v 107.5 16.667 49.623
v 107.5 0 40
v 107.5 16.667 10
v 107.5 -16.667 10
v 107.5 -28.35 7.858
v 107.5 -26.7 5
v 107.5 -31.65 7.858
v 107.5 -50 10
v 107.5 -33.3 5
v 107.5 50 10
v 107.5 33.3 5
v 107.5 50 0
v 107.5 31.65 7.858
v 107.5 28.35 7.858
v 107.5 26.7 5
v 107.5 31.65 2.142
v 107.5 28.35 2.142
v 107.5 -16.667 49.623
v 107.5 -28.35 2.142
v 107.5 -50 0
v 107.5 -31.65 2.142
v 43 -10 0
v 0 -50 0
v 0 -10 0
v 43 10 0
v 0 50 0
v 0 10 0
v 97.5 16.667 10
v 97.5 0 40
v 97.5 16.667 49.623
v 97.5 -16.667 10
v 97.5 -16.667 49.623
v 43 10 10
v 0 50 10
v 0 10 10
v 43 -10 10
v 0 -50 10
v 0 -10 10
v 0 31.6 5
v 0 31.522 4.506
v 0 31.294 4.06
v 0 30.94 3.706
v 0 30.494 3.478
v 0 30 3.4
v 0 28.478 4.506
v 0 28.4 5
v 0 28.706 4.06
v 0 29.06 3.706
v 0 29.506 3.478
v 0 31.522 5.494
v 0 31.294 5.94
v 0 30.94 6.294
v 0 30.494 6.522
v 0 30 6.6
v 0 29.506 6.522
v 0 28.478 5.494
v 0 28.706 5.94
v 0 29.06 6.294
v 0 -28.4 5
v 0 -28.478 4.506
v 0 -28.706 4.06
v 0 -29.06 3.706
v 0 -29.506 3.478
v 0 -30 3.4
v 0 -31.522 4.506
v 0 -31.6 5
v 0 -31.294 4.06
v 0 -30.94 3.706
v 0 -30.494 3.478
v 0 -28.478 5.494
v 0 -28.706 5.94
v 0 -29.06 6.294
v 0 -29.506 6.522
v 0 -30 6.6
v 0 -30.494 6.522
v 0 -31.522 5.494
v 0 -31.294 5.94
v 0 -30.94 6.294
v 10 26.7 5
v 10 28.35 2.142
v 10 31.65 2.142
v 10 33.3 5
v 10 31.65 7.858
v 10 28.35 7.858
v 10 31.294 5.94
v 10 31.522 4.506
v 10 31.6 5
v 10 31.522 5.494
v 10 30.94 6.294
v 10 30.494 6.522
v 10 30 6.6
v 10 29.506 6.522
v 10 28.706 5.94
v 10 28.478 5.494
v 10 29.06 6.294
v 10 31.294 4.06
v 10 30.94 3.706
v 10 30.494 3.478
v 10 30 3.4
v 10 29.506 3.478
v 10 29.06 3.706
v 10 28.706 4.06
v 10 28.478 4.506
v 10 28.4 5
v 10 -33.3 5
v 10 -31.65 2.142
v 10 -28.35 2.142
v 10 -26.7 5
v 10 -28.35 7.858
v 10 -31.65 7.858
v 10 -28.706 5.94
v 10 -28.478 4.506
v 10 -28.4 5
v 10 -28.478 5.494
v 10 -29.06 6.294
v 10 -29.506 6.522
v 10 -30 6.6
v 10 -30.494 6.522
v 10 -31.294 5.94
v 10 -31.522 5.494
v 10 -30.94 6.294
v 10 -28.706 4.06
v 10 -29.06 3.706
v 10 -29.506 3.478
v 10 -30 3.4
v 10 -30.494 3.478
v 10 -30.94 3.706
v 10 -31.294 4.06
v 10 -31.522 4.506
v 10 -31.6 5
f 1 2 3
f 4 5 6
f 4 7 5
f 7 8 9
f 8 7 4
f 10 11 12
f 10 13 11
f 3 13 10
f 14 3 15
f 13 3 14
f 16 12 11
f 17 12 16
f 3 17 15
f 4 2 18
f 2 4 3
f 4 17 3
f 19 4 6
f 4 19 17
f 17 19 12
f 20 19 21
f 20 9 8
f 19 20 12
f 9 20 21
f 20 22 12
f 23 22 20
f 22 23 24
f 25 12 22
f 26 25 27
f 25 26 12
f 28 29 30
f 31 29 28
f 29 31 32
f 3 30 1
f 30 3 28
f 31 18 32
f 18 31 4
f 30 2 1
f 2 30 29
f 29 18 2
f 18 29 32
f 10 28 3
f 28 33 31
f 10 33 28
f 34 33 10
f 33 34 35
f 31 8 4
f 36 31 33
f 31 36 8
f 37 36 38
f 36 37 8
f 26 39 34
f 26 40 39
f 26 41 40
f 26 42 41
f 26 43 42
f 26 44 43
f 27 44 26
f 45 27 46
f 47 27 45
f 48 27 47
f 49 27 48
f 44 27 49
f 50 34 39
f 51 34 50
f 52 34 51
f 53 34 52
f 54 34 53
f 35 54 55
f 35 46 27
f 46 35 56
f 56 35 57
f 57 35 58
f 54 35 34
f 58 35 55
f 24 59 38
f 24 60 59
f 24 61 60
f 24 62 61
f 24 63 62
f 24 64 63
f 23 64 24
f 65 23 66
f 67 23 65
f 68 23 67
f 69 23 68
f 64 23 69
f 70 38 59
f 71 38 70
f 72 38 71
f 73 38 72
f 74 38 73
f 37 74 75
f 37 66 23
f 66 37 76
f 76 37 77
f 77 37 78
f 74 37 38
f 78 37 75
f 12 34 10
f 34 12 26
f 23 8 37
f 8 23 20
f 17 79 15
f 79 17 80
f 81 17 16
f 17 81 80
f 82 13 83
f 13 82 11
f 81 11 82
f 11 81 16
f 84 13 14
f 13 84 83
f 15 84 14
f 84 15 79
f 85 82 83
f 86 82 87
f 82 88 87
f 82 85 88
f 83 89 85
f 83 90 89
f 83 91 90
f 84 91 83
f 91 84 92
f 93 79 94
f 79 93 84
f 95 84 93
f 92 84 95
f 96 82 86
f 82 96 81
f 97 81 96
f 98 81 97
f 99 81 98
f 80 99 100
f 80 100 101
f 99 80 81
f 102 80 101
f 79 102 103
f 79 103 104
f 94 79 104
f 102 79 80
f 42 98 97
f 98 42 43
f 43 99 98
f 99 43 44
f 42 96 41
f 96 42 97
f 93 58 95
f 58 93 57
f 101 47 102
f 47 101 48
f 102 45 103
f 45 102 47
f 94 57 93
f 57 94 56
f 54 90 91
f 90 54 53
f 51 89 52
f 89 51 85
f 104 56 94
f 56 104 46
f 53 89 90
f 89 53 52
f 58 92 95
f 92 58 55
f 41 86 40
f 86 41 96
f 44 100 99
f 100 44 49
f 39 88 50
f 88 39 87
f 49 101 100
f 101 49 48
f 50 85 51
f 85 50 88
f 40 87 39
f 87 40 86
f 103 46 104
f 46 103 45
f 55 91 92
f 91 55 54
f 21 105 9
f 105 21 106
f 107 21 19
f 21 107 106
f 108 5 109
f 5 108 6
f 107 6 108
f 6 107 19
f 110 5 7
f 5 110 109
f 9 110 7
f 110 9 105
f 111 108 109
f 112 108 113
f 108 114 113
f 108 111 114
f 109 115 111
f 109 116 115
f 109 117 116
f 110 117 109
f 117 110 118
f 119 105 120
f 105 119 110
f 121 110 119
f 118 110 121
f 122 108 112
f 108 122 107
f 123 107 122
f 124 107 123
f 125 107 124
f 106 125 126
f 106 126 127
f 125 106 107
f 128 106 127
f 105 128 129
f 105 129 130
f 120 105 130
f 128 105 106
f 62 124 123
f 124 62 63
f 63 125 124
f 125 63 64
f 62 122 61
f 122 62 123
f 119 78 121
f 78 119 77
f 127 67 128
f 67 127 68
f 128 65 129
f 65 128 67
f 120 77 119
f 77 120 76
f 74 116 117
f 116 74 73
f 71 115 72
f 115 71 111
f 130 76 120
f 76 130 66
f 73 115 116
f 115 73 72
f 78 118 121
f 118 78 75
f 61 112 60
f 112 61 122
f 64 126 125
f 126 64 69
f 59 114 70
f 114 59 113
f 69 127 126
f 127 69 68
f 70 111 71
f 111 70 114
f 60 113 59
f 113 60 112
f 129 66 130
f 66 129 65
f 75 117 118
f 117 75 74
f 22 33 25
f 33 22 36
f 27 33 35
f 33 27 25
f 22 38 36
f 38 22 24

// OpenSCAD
// file: ../lib/naca4.scad
// Naca4.scad - library for parametric airfoils of 4 digit NACA series
// Code: Rudolf Huttary, Berlin 
// June 2015
// commercial use prohibited


// general use: for more examples refer to sampler.scad
// naca = naca digits or 3el vector  (default = 12 or [0, 0, .12])
// L    = chord length [mm]      (default= 100)
// N    = # sample points        (default= 81)
// h    = height [mm]            (default= 1)
// open = close at the thin end? (default = true)
// two equivalent example calls
 airfoil(naca = 2408, L = 60, N=1001, h = 30, open = false); 
// airfoil(naca = [.2, .4, .32], L = 60, N=1001, h = 30, open = false); 

module help()
{
  echo(str("\n\nList of signatures in lib:\n=================\n", 
  "module airfoil(naca=2412, L = 100, N = 81, h = 1, open = false) - renders airfoil object\n", 
  "module airfoil(naca=[.2, .4, .12], L = 100, N = 81, h = 1, open = false) - renders airfoil object using percentage for camber,  camber distance and thicknes\n", 
  "function airfoil_data(naca=12, L = 100, N = 81, open = false)\n",
  "=================\n")); 
}

help(); 
// this is the object
module airfoil(naca=12, L = 100, N = 81, h = 1, open = false)
{
  linear_extrude(height = h)
  polygon(points = airfoil_data(naca, L, N, open)); 
}

module hollow_airfoil(lnaca=12, L = 100, N = 81, h = 1, open = false, wall_thickness = 1)
{
    if (open){
        linear_extrude(height = h)
            difference(){
                polygon(points = airfoil_data(naca, L, N, false));
                offset(delta = - wall_thickness, chamfer = false) polygon(points = airfoil_data(naca, L, N, open = false));
            }
    }
    else{

        linear_extrude(height = wall_thickness)
            polygon(points = airfoil_data(naca, L, N, false)); 

        linear_extrude(height = h)
            difference(){
                polygon(points = airfoil_data(naca, L, N, open));
                offset(delta = - wall_thickness) polygon(points = airfoil_data(naca, L, N, open = false));
            }

        translate([0,0, h - wall_thickness])
            linear_extrude(height = wall_thickness)
                polygon(points = airfoil_data(naca, L, N, false)); 

    }
}


// this is the main function providing the airfoil data
function airfoil_data(naca=12, L = 100, N = 81, open = false) = 
  let(Na = len(naca)!=3?NACA(naca):naca)
  let(A = [.2969, -0.126, -.3516, .2843, open?-0.1015:-0.1036])
  [for (b=[-180:360/(N):179.99]) 
    let (x = (1-cos(b))/2)  
    let(yt = sign(b)*Na[2]/.2*(A*[sqrt(x), x, x*x, x*x*x, x*x*x*x])) 
    Na[0]==0?L*[x, yt]:L*camber(x, yt, Na[0], Na[1], sign(b))];  


function trailing_edge_angle(naca=12, open = false) = 
  let(Na = len(naca)!=3?NACA(naca):naca)
  let(A = [.2969, -0.126, -.3516, .2843, open?-0.1015:-0.1036])
  let (x =0.999)  // set x near to airfoil trailing edge
  let(yt = Na[2]/.2*(A*[sqrt(x), x, x*x, x*x*x, x*x*x*x])) // calculate distance from x-axis at previously set position
  atan2(yt,1-x);  // calculate angle of triangle between end of airfoil. The triange height corresponds to previously calculated distance from x-axis

function surface_angle(x = 0.5, naca=12, open = false) = 
  let(Na = len(naca)!=3?NACA(naca):naca)
  let(A = [0.2969, -0.126, -0.3516, 0.2843, open?-0.1015:-0.1036])
  let(dy = Na[2]/0.2*(A*[(1/2)*(1/sqrt(x)), 1, 2*x, 3*x*x, 4*x*x*x])) // calculate derivative of airfoil function at the x point
  atan(dy);  // calculate  the angle from function derivative

function surface_distance(x = 0.5, naca=12, open = false) = 
  let(Na = len(naca)!=3?NACA(naca):naca)
  let(A = [0.2969, -0.126, -0.3516, 0.2843, open?-0.1015:-0.1036])
  Na[2]/.2*(A*[sqrt(x), x, x*x, x*x*x, x*x*x*x]); // calculate distance from x-axis at previously set position

// helper functions
function NACA(naca) = 
  let (M = floor(naca/1000))
  let (P = floor((naca-M*1000)/100)) 
  [M/100, P/10, floor(naca-M*1000-P*100)/100];  

function camber(x, y, M, P, upper) = 
  let(yc = (x<P)?M/P/P*(2*P*x-x*x): M/(1-P)/(1-P)*(1 - 2*P + 2*P*x -x*x))
  let(dy = (x<P)?2*M/P/P*(P-x):2*M/(1-P)/(1-P)*(P-x))
  let(th = atan(dy))
  [upper ? x - y*sin(th):x + y*sin(th), upper ? yc + y*cos(th):yc - y*cos(th)];
// file: ../888_1009.scad
//vyvažovací přípravek


wall_thickness=10; 

module 888_1009_base_half(x_size = 215, y_size = 100, z_size = 20, thickness = 10){     //základna

render()
    difference(){
        union(){
            translate([0, -y_size/2, 0])
                cube([x_size/2, y_size, thickness], center = false);         //základní plocha


            //podpěra

                    difference(){

                        translate([x_size/2 - thickness, -y_size/6,0])
                            cube([thickness,y_size/3,5*thickness]);          //základní plocha pro zkosení

                        //vyskousnutí
                        translate([x_size/2 - thickness,0,4*thickness])
                            rotate([30,0,0])
                                cube([thickness,y_size/3,20]);

                        mirror([0,1,0])
                        translate([x_size/2 - thickness,0,4*thickness])
                            rotate([30,0,0])
                                cube([thickness,y_size/3,20]);    


                    }
        }

    //otvory pro šrouby M3
    translate([thickness, 120/4, thickness/2])
        rotate([0,90,0])
        {   
            rotate([0,0,30]) // srovnání matky s povrchem placatou stranou
                cylinder(h = x_size, d = Nut_diameter_M3, $fn = 6);
            cylinder(h = x_size, d = M3_screw_diameter, $fn = 20, center = true);
        }

    translate([thickness,- 120/4, thickness/2])
        rotate([0,90,0])
        {   
            rotate([0,0,30])
                cylinder(h = x_size, d = Nut_diameter_M3, $fn = 6);
            cylinder(h = x_size, d = M3_screw_diameter, $fn = 20, center = true);
        }

    // odlehčení podložky
    translate([0, -y_size/10, 0])
        cube([x_size/5, y_size/5, thickness], center = false);         //základní plocha


    }

//final module základna
}



module 888_1009_base(){		//základna

    888_1009_base_half();
    mirror([1,0,0])
        888_1009_base_half();


}


module 888_1009_shape_A(x_size = 130, y_size = 60, z_size = 8){

    airfoil_NACA = 0016;    // typ použitého profilu
    airfoil_depth = 50; // hloubka profilu
    length = 200;       // celková délka polotovaru
    bridge_thickness = 0.6;  // tloušťka spojení mezi rotorovým listem a rámečkem
    airfoil_thickness = (airfoil_NACA/100) * (airfoil_depth + bridge_thickness); // vypočtená maximální tloušťka profilu

    render()
    difference(){
        //základní materiál
		color([0,0.5,0])
		translate ([160/2 - 25, 0, 0])
			minkowski(){
				cube([x_size/2-25,y_size/2 - 25,z_size-1], center = true);
	            cylinder(h = 1, r =  25, $fn = 50, center = true);
			}
        //otvor pro rotorový list
		rotate([0,0,45])
			cube([45,150,40], center = true);

        translate ([ 0, 0, 20])
			rotate([0,0,45])
				cube([50,150,40], center = true);

               
/*        rotate([0,0,45])
            666_1201(draft = true, holes = true);*/
        rotate([0,0,45])
            translate ([ -airfoil_depth/2, length/2, 0])
                rotate([90, 0, 0])
                    airfoil(naca = airfoil_NACA, L = airfoil_depth + bridge_thickness, N = 100, h = length, open = false);  

        //otvory pro šrouby
        translate([110/2 - x_size/10, 0, 0])
            cylinder(h = 10, d =  6.5, $fn = 20, center = true);
    }

/*    color([1,0.5,0])
        rotate([0,0,45])
            translate ([ -airfoil_depth/2, length/2, 0])
                rotate([90, 0, 0])
                    airfoil(naca = airfoil_NACA, L = airfoil_depth + bridge_thickness, N = 100, h = length, open = false);  
*/
}

module 888_1009_shape(x_size = 130, y_size = 60, z_size = 8){

    airfoil_NACA = 0016;    // typ použitého profilu
    airfoil_depth = 50; // hloubka profilu
    length = 200;       // celková délka polotovaru
    bridge_thickness = 0.6;  // tloušťka spojení mezi rotorovým listem a rámečkem
    airfoil_thickness = (airfoil_NACA/100) * (airfoil_depth + bridge_thickness); // vypočtená maximální tloušťka profilu

    color("orange")
    %    cube([160,100,8], center = true);
    

    render()
    difference(){
        //základní materiál
		color([0,0.5,0])
		minkowski(){
			cube([x_size/2-25,y_size/2 - 25,z_size], center = true);
            cylinder(h = 1, r =  25, $fn = 50, center = true);
		}
        //otvor pro rotorový list
		rotate([0,0,45])
			cube([45,150,40], center = true);
               
/*\        rotate([0,0,45])
            666_1201(draft = true, holes = true);*/
        rotate([0,0,45])
            translate ([ -airfoil_depth/2, length/2, 0])
                rotate([90, 0, 0])
                    airfoil(naca = airfoil_NACA, L = airfoil_depth + bridge_thickness, N = 100, h = length, open = false);  

        //otvory pro šrouby
        translate([110/2 - x_size/10, 0, 0])
            cylinder(h = 10, d =  6.5, $fn = 20, center = true);

        translate([-110/2, 0, 0])
            cylinder(h = 10, d =  6.5, $fn = 20, center = true);

    }

/*    color([1,0.5,0])
        rotate([0,0,45])
            translate ([ -airfoil_depth/2, length/2, 0])
                rotate([90, 0, 0])
                    airfoil(naca = airfoil_NACA, L = airfoil_depth + bridge_thickness, N = 100, h = length, open = false);  
*/



//final module tvar
}


module 888_1009_cradle_half(x_size = 210, y_size = 100, z_size = 20, thickness = 10){		//kolébka

render()
    difference(){
        union(){
        	//základní deska
        	translate([0,-y_size/2,0])
        	color([0.5,0,0])
        		cube([x_size/2 - thickness*1.5, y_size, thickness]);


        	difference(){
        		translate([x_size/2 - thickness*2.5,-y_size/2,0])
        			color([0.5,0,0])
        				cube([wall_thickness*(1.5+2),y_size,wall_thickness*3]);
        		
        		translate([x_size/2 - thickness, 0, thickness + 4])
        			rotate([-16,0,0])
                        translate([0, 0, -thickness - 4])
        				    cube([thickness*1.5, y_size,y_size/2]);

                mirror([0,1,0])
                    translate([x_size/2 - thickness, 0, thickness + 4])
                        rotate([-16,0,0])
                            translate([0, 0, -thickness - 4])
                                cube([thickness*1.5, y_size,50]);

        		// zůžení přesahující kostky
        		translate([x_size/2 + thickness, -y_size/3, 25/2])
        			cube([thickness*1.5, y_size/2, 50],center = true);

        		translate([x_size/2 + thickness, y_size/3, 25/2])
        			cube([thickness*1.5, y_size/2, 50],center = true);
                

        	}
        }

        translate([thickness, 80/4, thickness/2])
            rotate([0,90,0])
            {    
                rotate([0,0,30])
                    cylinder(h = x_size, d = Nut_diameter_M3, $fn = 6);
                cylinder(h = x_size, d = M3_screw_diameter, $fn = 20, center = true);
            }

        translate([thickness,- 80/4,thickness/2])
            rotate([0,90,0])    
            {    
                rotate([0,0,30])
                    cylinder(h = x_size, d = Nut_diameter_M3, $fn = 6);
                cylinder(h = x_size, d = M3_screw_diameter, $fn = 20, center = true);
            }

        //otvor pro šrouby k uchycení listu
        translate([110/2, 0, 0])
            cylinder(h = 3*thickness, d =  6.5, $fn = 20, center = true);

    }
}


module 888_1009_cradle(x_size = 180, y_size = 80, z_size = 20, thickness = 10){		//kolébka

	888_1009_cradle_half();

    mirror([1,0,0])
        888_1009_cradle_half();


    translate([0,0,thickness+4])
        %cube([160, 100, 8],center = true);


}


translate([0,0,30])
		888_1009_cradle();

/*translate([0,0,100])
		888_1009_shape_A();
*/
		888_1009_base();


include <../Parameters.scad>
use <./lib/naca4.scad>
include <../Parameters.scad>
// file: ../../Parameters.scad
//Main tube diameter - hole [mm]
main_tube_outer_diameter = 25.4;
main_tube_inner_diameter = 23.5;

//Tube for undercarriage - hole [mm]
tube_for_undercarriage_outer_diameter = 10.6;
tube_for_undercarriage_inner_diameter = 6;
global_clearance = 0.5;


//umístění podvozkových trubek

second_undercarriage_hole = main_tube_outer_diameter*2 + main_tube_outer_diameter/5 + main_tube_outer_diameter/2 + 170 + 160;

// Parameters of tube couplings
coupling_wall_thickness = main_tube_outer_diameter/5;  //width of coupling walls 
thickness_between_tubes = main_tube_outer_diameter/10;    // minimum distance between tubes in couplings

coupling_wall_thickness_undercarriage = tube_for_undercarriage_outer_diameter/3;
thickness_between_tubes_undercarriage = tube_for_undercarriage_outer_diameter/10;

//Screw diameter and nut for M4 [mm]
M4_screw_diameter=4.5;
Nut_height_M4 = 3.2;
Nut_diameter_M4 = 8.4;


//Screw diameter and nut for M3 [mm]
M3_screw_diameter = 3.2;
Nut_height_M3 = 2.7;	
Nut_diameter_M3 = 6.6; 


//The tube for help
Help_main_tube_outer = 25;
Help_main_tube_inner = 23; 
Help_tube_for_undercarriage_outer = 10;
Help_tube_for_undercarriage_inner = 5;


//main hull parameters

hull_drop_length = 580;
hull_wall_thickness = 0.8;
hull_y_size = 120;
hull_z_size = 150;
hull_x_size = 580;
hull_corner_radius = 4;
hull_airfoil_thickness= 35;  // thickness of drop generating airfoil in percent of lenght.
hull_scale_x = 1;
hull_scale_y = 1.5;
hull_scale_z = 1.5;

main_pilon_position = 170+68;
cover_pilon_position = 180;
height_of_vertical_tube = 275; //278mm je změřená délka trubky. 

//délka hlavní dlouhé trubky
length_of_main_tube = 920;
length_of_undercarriage_tube = 300;

ribbon_width = 5; // šířka vyztužovacích lemů. 

// šířka otvoru v přední části kapoty pro držák motoru.
width_of_engine_holder = 63;

//Top Cover Division - dělení horního krytu pro tisk
top_cover_division = [0, 50, 150, 280, 410, hull_x_size]; // upraveny seznam tak, aby deleni začinalo od nuly, což umožňí úplně automatické rozdělení.

//Bottom Cover Division - dělení dolního krytu pro tisk
bottom_cover_division = [0,100,232.5,365, 470, hull_x_size];
// zkrácená část pro payload pro testovací tisk
//bottom_cover_division = [0,200,250,365, 470, hull_x_size];

//Base Divison - dělení podložky
base_division = [0, 140, main_pilon_position - (3*main_tube_outer_diameter)/2 + 3 * main_tube_outer_diameter,second_undercarriage_hole - main_tube_outer_diameter/2 - coupling_wall_thickness + main_tube_outer_diameter+2*(main_tube_outer_diameter/5) + global_clearance, hull_x_size];

//Cover pilon division - na výšku (v ose Z)
cover_pilon_division = [0,170,height_of_vertical_tube + main_tube_outer_diameter + coupling_wall_thickness];

//pozice šroubů
	//horní kryt
top_screw_position = [0,
                    (top_cover_division[0] + top_cover_division[1])/2,
                    (top_cover_division[2] - top_cover_division[1])/2 + top_cover_division[1],
                    (top_cover_division[3] - top_cover_division[2])/2 + top_cover_division[2],
                    (top_cover_division[4] - top_cover_division[3])/8 + top_cover_division[3],
                    (top_cover_division[5] - top_cover_division[4])/2 + top_cover_division[4] - top_cover_division[1]/3];
	//spodní kryt
bottom_screw_position = [0,
                        (bottom_cover_division[0] + bottom_cover_division[1])*(2/6), 
                        bottom_cover_division[1]*(9/10), 
                        bottom_cover_division[3] + bottom_cover_division[1]*(1/10), 
                        bottom_cover_division[3] + bottom_cover_division[1]*(3/5)];




//šířka zámků
lock_width = 10;

//délka zámků
lock_length = 3;


//accumulator
//základní rozměry akumulátoru
width_of_accumulator = 129.4;//45+1;
depth_of_accumulator = 40.61;
height_of_accumulator = 43.65;
//Zapuštění akumulátoru
sink_of_accumulator = 5; //main_tube_outer_diameter/5 - Nut_height_M3*1.5;

//tloušťka hrany spojky
accumulator_holder_width = 18; 
accumulator_holder_thickness = 10; 

//posunutí akumálátoru na podložce
move_of_accumulator = 165;   // pozice akumulátoru (ovlivňuje těžiště)


////////////////
// Senzory
///////////////////

//opticalFlow
    width_optical_flow_senzor = 45.5;
    depth_optical_flow_senzor = 6;
    height_optical_flow_senzor = 35;
    sink_of_optical_flow_senzor = depth_optical_flow_senzor - 5; 
    M3_optical_flow_senzor_Z = 30.4;
    M3_optical_flow_senzor_X = 24;
    M3_optical_flow_senzor_Z_alone = 9.1;
    M3_optical_flow_senzor_X_alone = 16.7;

//GPS anténa
GPS_outer_length = 48.01;   //Vnější rozměr
GPS_inner_length = 37.48;   //Vnitřní rozměr
GPS_diameter = (GPS_outer_length - GPS_inner_length)/2;    //Průměr otvoru
GPS_middle_length = GPS_diameter + GPS_inner_length;      //Střední rozměr


////podzvozek

radius_undercarriage = 25;
vzdalenost_x = tan(20) * 131;
vzdalenost_y = (131 - radius_undercarriage)/tan(79);

maximum_printable_size = 150;


////Pitotova trubice
Pitot_tube_diameter = 4.02 + 1;
Distance_hole_from_tube = 11.92;  //vzdálenost otvoru pro připevnění od samotné trubičky


////směrové kormidlo
Rudder_length = 4*main_tube_outer_diameter;
Rudder_height = 2*main_tube_outer_diameter;
Rudder_depth = main_tube_outer_diameter/2;
gap_width = 2*hull_wall_thickness;      //šířka mezery mezi směrovkou a ocasní plochou
// main file
include <../../Parameters.scad>
use <../888_1009.scad>

888_1009_base_half();
